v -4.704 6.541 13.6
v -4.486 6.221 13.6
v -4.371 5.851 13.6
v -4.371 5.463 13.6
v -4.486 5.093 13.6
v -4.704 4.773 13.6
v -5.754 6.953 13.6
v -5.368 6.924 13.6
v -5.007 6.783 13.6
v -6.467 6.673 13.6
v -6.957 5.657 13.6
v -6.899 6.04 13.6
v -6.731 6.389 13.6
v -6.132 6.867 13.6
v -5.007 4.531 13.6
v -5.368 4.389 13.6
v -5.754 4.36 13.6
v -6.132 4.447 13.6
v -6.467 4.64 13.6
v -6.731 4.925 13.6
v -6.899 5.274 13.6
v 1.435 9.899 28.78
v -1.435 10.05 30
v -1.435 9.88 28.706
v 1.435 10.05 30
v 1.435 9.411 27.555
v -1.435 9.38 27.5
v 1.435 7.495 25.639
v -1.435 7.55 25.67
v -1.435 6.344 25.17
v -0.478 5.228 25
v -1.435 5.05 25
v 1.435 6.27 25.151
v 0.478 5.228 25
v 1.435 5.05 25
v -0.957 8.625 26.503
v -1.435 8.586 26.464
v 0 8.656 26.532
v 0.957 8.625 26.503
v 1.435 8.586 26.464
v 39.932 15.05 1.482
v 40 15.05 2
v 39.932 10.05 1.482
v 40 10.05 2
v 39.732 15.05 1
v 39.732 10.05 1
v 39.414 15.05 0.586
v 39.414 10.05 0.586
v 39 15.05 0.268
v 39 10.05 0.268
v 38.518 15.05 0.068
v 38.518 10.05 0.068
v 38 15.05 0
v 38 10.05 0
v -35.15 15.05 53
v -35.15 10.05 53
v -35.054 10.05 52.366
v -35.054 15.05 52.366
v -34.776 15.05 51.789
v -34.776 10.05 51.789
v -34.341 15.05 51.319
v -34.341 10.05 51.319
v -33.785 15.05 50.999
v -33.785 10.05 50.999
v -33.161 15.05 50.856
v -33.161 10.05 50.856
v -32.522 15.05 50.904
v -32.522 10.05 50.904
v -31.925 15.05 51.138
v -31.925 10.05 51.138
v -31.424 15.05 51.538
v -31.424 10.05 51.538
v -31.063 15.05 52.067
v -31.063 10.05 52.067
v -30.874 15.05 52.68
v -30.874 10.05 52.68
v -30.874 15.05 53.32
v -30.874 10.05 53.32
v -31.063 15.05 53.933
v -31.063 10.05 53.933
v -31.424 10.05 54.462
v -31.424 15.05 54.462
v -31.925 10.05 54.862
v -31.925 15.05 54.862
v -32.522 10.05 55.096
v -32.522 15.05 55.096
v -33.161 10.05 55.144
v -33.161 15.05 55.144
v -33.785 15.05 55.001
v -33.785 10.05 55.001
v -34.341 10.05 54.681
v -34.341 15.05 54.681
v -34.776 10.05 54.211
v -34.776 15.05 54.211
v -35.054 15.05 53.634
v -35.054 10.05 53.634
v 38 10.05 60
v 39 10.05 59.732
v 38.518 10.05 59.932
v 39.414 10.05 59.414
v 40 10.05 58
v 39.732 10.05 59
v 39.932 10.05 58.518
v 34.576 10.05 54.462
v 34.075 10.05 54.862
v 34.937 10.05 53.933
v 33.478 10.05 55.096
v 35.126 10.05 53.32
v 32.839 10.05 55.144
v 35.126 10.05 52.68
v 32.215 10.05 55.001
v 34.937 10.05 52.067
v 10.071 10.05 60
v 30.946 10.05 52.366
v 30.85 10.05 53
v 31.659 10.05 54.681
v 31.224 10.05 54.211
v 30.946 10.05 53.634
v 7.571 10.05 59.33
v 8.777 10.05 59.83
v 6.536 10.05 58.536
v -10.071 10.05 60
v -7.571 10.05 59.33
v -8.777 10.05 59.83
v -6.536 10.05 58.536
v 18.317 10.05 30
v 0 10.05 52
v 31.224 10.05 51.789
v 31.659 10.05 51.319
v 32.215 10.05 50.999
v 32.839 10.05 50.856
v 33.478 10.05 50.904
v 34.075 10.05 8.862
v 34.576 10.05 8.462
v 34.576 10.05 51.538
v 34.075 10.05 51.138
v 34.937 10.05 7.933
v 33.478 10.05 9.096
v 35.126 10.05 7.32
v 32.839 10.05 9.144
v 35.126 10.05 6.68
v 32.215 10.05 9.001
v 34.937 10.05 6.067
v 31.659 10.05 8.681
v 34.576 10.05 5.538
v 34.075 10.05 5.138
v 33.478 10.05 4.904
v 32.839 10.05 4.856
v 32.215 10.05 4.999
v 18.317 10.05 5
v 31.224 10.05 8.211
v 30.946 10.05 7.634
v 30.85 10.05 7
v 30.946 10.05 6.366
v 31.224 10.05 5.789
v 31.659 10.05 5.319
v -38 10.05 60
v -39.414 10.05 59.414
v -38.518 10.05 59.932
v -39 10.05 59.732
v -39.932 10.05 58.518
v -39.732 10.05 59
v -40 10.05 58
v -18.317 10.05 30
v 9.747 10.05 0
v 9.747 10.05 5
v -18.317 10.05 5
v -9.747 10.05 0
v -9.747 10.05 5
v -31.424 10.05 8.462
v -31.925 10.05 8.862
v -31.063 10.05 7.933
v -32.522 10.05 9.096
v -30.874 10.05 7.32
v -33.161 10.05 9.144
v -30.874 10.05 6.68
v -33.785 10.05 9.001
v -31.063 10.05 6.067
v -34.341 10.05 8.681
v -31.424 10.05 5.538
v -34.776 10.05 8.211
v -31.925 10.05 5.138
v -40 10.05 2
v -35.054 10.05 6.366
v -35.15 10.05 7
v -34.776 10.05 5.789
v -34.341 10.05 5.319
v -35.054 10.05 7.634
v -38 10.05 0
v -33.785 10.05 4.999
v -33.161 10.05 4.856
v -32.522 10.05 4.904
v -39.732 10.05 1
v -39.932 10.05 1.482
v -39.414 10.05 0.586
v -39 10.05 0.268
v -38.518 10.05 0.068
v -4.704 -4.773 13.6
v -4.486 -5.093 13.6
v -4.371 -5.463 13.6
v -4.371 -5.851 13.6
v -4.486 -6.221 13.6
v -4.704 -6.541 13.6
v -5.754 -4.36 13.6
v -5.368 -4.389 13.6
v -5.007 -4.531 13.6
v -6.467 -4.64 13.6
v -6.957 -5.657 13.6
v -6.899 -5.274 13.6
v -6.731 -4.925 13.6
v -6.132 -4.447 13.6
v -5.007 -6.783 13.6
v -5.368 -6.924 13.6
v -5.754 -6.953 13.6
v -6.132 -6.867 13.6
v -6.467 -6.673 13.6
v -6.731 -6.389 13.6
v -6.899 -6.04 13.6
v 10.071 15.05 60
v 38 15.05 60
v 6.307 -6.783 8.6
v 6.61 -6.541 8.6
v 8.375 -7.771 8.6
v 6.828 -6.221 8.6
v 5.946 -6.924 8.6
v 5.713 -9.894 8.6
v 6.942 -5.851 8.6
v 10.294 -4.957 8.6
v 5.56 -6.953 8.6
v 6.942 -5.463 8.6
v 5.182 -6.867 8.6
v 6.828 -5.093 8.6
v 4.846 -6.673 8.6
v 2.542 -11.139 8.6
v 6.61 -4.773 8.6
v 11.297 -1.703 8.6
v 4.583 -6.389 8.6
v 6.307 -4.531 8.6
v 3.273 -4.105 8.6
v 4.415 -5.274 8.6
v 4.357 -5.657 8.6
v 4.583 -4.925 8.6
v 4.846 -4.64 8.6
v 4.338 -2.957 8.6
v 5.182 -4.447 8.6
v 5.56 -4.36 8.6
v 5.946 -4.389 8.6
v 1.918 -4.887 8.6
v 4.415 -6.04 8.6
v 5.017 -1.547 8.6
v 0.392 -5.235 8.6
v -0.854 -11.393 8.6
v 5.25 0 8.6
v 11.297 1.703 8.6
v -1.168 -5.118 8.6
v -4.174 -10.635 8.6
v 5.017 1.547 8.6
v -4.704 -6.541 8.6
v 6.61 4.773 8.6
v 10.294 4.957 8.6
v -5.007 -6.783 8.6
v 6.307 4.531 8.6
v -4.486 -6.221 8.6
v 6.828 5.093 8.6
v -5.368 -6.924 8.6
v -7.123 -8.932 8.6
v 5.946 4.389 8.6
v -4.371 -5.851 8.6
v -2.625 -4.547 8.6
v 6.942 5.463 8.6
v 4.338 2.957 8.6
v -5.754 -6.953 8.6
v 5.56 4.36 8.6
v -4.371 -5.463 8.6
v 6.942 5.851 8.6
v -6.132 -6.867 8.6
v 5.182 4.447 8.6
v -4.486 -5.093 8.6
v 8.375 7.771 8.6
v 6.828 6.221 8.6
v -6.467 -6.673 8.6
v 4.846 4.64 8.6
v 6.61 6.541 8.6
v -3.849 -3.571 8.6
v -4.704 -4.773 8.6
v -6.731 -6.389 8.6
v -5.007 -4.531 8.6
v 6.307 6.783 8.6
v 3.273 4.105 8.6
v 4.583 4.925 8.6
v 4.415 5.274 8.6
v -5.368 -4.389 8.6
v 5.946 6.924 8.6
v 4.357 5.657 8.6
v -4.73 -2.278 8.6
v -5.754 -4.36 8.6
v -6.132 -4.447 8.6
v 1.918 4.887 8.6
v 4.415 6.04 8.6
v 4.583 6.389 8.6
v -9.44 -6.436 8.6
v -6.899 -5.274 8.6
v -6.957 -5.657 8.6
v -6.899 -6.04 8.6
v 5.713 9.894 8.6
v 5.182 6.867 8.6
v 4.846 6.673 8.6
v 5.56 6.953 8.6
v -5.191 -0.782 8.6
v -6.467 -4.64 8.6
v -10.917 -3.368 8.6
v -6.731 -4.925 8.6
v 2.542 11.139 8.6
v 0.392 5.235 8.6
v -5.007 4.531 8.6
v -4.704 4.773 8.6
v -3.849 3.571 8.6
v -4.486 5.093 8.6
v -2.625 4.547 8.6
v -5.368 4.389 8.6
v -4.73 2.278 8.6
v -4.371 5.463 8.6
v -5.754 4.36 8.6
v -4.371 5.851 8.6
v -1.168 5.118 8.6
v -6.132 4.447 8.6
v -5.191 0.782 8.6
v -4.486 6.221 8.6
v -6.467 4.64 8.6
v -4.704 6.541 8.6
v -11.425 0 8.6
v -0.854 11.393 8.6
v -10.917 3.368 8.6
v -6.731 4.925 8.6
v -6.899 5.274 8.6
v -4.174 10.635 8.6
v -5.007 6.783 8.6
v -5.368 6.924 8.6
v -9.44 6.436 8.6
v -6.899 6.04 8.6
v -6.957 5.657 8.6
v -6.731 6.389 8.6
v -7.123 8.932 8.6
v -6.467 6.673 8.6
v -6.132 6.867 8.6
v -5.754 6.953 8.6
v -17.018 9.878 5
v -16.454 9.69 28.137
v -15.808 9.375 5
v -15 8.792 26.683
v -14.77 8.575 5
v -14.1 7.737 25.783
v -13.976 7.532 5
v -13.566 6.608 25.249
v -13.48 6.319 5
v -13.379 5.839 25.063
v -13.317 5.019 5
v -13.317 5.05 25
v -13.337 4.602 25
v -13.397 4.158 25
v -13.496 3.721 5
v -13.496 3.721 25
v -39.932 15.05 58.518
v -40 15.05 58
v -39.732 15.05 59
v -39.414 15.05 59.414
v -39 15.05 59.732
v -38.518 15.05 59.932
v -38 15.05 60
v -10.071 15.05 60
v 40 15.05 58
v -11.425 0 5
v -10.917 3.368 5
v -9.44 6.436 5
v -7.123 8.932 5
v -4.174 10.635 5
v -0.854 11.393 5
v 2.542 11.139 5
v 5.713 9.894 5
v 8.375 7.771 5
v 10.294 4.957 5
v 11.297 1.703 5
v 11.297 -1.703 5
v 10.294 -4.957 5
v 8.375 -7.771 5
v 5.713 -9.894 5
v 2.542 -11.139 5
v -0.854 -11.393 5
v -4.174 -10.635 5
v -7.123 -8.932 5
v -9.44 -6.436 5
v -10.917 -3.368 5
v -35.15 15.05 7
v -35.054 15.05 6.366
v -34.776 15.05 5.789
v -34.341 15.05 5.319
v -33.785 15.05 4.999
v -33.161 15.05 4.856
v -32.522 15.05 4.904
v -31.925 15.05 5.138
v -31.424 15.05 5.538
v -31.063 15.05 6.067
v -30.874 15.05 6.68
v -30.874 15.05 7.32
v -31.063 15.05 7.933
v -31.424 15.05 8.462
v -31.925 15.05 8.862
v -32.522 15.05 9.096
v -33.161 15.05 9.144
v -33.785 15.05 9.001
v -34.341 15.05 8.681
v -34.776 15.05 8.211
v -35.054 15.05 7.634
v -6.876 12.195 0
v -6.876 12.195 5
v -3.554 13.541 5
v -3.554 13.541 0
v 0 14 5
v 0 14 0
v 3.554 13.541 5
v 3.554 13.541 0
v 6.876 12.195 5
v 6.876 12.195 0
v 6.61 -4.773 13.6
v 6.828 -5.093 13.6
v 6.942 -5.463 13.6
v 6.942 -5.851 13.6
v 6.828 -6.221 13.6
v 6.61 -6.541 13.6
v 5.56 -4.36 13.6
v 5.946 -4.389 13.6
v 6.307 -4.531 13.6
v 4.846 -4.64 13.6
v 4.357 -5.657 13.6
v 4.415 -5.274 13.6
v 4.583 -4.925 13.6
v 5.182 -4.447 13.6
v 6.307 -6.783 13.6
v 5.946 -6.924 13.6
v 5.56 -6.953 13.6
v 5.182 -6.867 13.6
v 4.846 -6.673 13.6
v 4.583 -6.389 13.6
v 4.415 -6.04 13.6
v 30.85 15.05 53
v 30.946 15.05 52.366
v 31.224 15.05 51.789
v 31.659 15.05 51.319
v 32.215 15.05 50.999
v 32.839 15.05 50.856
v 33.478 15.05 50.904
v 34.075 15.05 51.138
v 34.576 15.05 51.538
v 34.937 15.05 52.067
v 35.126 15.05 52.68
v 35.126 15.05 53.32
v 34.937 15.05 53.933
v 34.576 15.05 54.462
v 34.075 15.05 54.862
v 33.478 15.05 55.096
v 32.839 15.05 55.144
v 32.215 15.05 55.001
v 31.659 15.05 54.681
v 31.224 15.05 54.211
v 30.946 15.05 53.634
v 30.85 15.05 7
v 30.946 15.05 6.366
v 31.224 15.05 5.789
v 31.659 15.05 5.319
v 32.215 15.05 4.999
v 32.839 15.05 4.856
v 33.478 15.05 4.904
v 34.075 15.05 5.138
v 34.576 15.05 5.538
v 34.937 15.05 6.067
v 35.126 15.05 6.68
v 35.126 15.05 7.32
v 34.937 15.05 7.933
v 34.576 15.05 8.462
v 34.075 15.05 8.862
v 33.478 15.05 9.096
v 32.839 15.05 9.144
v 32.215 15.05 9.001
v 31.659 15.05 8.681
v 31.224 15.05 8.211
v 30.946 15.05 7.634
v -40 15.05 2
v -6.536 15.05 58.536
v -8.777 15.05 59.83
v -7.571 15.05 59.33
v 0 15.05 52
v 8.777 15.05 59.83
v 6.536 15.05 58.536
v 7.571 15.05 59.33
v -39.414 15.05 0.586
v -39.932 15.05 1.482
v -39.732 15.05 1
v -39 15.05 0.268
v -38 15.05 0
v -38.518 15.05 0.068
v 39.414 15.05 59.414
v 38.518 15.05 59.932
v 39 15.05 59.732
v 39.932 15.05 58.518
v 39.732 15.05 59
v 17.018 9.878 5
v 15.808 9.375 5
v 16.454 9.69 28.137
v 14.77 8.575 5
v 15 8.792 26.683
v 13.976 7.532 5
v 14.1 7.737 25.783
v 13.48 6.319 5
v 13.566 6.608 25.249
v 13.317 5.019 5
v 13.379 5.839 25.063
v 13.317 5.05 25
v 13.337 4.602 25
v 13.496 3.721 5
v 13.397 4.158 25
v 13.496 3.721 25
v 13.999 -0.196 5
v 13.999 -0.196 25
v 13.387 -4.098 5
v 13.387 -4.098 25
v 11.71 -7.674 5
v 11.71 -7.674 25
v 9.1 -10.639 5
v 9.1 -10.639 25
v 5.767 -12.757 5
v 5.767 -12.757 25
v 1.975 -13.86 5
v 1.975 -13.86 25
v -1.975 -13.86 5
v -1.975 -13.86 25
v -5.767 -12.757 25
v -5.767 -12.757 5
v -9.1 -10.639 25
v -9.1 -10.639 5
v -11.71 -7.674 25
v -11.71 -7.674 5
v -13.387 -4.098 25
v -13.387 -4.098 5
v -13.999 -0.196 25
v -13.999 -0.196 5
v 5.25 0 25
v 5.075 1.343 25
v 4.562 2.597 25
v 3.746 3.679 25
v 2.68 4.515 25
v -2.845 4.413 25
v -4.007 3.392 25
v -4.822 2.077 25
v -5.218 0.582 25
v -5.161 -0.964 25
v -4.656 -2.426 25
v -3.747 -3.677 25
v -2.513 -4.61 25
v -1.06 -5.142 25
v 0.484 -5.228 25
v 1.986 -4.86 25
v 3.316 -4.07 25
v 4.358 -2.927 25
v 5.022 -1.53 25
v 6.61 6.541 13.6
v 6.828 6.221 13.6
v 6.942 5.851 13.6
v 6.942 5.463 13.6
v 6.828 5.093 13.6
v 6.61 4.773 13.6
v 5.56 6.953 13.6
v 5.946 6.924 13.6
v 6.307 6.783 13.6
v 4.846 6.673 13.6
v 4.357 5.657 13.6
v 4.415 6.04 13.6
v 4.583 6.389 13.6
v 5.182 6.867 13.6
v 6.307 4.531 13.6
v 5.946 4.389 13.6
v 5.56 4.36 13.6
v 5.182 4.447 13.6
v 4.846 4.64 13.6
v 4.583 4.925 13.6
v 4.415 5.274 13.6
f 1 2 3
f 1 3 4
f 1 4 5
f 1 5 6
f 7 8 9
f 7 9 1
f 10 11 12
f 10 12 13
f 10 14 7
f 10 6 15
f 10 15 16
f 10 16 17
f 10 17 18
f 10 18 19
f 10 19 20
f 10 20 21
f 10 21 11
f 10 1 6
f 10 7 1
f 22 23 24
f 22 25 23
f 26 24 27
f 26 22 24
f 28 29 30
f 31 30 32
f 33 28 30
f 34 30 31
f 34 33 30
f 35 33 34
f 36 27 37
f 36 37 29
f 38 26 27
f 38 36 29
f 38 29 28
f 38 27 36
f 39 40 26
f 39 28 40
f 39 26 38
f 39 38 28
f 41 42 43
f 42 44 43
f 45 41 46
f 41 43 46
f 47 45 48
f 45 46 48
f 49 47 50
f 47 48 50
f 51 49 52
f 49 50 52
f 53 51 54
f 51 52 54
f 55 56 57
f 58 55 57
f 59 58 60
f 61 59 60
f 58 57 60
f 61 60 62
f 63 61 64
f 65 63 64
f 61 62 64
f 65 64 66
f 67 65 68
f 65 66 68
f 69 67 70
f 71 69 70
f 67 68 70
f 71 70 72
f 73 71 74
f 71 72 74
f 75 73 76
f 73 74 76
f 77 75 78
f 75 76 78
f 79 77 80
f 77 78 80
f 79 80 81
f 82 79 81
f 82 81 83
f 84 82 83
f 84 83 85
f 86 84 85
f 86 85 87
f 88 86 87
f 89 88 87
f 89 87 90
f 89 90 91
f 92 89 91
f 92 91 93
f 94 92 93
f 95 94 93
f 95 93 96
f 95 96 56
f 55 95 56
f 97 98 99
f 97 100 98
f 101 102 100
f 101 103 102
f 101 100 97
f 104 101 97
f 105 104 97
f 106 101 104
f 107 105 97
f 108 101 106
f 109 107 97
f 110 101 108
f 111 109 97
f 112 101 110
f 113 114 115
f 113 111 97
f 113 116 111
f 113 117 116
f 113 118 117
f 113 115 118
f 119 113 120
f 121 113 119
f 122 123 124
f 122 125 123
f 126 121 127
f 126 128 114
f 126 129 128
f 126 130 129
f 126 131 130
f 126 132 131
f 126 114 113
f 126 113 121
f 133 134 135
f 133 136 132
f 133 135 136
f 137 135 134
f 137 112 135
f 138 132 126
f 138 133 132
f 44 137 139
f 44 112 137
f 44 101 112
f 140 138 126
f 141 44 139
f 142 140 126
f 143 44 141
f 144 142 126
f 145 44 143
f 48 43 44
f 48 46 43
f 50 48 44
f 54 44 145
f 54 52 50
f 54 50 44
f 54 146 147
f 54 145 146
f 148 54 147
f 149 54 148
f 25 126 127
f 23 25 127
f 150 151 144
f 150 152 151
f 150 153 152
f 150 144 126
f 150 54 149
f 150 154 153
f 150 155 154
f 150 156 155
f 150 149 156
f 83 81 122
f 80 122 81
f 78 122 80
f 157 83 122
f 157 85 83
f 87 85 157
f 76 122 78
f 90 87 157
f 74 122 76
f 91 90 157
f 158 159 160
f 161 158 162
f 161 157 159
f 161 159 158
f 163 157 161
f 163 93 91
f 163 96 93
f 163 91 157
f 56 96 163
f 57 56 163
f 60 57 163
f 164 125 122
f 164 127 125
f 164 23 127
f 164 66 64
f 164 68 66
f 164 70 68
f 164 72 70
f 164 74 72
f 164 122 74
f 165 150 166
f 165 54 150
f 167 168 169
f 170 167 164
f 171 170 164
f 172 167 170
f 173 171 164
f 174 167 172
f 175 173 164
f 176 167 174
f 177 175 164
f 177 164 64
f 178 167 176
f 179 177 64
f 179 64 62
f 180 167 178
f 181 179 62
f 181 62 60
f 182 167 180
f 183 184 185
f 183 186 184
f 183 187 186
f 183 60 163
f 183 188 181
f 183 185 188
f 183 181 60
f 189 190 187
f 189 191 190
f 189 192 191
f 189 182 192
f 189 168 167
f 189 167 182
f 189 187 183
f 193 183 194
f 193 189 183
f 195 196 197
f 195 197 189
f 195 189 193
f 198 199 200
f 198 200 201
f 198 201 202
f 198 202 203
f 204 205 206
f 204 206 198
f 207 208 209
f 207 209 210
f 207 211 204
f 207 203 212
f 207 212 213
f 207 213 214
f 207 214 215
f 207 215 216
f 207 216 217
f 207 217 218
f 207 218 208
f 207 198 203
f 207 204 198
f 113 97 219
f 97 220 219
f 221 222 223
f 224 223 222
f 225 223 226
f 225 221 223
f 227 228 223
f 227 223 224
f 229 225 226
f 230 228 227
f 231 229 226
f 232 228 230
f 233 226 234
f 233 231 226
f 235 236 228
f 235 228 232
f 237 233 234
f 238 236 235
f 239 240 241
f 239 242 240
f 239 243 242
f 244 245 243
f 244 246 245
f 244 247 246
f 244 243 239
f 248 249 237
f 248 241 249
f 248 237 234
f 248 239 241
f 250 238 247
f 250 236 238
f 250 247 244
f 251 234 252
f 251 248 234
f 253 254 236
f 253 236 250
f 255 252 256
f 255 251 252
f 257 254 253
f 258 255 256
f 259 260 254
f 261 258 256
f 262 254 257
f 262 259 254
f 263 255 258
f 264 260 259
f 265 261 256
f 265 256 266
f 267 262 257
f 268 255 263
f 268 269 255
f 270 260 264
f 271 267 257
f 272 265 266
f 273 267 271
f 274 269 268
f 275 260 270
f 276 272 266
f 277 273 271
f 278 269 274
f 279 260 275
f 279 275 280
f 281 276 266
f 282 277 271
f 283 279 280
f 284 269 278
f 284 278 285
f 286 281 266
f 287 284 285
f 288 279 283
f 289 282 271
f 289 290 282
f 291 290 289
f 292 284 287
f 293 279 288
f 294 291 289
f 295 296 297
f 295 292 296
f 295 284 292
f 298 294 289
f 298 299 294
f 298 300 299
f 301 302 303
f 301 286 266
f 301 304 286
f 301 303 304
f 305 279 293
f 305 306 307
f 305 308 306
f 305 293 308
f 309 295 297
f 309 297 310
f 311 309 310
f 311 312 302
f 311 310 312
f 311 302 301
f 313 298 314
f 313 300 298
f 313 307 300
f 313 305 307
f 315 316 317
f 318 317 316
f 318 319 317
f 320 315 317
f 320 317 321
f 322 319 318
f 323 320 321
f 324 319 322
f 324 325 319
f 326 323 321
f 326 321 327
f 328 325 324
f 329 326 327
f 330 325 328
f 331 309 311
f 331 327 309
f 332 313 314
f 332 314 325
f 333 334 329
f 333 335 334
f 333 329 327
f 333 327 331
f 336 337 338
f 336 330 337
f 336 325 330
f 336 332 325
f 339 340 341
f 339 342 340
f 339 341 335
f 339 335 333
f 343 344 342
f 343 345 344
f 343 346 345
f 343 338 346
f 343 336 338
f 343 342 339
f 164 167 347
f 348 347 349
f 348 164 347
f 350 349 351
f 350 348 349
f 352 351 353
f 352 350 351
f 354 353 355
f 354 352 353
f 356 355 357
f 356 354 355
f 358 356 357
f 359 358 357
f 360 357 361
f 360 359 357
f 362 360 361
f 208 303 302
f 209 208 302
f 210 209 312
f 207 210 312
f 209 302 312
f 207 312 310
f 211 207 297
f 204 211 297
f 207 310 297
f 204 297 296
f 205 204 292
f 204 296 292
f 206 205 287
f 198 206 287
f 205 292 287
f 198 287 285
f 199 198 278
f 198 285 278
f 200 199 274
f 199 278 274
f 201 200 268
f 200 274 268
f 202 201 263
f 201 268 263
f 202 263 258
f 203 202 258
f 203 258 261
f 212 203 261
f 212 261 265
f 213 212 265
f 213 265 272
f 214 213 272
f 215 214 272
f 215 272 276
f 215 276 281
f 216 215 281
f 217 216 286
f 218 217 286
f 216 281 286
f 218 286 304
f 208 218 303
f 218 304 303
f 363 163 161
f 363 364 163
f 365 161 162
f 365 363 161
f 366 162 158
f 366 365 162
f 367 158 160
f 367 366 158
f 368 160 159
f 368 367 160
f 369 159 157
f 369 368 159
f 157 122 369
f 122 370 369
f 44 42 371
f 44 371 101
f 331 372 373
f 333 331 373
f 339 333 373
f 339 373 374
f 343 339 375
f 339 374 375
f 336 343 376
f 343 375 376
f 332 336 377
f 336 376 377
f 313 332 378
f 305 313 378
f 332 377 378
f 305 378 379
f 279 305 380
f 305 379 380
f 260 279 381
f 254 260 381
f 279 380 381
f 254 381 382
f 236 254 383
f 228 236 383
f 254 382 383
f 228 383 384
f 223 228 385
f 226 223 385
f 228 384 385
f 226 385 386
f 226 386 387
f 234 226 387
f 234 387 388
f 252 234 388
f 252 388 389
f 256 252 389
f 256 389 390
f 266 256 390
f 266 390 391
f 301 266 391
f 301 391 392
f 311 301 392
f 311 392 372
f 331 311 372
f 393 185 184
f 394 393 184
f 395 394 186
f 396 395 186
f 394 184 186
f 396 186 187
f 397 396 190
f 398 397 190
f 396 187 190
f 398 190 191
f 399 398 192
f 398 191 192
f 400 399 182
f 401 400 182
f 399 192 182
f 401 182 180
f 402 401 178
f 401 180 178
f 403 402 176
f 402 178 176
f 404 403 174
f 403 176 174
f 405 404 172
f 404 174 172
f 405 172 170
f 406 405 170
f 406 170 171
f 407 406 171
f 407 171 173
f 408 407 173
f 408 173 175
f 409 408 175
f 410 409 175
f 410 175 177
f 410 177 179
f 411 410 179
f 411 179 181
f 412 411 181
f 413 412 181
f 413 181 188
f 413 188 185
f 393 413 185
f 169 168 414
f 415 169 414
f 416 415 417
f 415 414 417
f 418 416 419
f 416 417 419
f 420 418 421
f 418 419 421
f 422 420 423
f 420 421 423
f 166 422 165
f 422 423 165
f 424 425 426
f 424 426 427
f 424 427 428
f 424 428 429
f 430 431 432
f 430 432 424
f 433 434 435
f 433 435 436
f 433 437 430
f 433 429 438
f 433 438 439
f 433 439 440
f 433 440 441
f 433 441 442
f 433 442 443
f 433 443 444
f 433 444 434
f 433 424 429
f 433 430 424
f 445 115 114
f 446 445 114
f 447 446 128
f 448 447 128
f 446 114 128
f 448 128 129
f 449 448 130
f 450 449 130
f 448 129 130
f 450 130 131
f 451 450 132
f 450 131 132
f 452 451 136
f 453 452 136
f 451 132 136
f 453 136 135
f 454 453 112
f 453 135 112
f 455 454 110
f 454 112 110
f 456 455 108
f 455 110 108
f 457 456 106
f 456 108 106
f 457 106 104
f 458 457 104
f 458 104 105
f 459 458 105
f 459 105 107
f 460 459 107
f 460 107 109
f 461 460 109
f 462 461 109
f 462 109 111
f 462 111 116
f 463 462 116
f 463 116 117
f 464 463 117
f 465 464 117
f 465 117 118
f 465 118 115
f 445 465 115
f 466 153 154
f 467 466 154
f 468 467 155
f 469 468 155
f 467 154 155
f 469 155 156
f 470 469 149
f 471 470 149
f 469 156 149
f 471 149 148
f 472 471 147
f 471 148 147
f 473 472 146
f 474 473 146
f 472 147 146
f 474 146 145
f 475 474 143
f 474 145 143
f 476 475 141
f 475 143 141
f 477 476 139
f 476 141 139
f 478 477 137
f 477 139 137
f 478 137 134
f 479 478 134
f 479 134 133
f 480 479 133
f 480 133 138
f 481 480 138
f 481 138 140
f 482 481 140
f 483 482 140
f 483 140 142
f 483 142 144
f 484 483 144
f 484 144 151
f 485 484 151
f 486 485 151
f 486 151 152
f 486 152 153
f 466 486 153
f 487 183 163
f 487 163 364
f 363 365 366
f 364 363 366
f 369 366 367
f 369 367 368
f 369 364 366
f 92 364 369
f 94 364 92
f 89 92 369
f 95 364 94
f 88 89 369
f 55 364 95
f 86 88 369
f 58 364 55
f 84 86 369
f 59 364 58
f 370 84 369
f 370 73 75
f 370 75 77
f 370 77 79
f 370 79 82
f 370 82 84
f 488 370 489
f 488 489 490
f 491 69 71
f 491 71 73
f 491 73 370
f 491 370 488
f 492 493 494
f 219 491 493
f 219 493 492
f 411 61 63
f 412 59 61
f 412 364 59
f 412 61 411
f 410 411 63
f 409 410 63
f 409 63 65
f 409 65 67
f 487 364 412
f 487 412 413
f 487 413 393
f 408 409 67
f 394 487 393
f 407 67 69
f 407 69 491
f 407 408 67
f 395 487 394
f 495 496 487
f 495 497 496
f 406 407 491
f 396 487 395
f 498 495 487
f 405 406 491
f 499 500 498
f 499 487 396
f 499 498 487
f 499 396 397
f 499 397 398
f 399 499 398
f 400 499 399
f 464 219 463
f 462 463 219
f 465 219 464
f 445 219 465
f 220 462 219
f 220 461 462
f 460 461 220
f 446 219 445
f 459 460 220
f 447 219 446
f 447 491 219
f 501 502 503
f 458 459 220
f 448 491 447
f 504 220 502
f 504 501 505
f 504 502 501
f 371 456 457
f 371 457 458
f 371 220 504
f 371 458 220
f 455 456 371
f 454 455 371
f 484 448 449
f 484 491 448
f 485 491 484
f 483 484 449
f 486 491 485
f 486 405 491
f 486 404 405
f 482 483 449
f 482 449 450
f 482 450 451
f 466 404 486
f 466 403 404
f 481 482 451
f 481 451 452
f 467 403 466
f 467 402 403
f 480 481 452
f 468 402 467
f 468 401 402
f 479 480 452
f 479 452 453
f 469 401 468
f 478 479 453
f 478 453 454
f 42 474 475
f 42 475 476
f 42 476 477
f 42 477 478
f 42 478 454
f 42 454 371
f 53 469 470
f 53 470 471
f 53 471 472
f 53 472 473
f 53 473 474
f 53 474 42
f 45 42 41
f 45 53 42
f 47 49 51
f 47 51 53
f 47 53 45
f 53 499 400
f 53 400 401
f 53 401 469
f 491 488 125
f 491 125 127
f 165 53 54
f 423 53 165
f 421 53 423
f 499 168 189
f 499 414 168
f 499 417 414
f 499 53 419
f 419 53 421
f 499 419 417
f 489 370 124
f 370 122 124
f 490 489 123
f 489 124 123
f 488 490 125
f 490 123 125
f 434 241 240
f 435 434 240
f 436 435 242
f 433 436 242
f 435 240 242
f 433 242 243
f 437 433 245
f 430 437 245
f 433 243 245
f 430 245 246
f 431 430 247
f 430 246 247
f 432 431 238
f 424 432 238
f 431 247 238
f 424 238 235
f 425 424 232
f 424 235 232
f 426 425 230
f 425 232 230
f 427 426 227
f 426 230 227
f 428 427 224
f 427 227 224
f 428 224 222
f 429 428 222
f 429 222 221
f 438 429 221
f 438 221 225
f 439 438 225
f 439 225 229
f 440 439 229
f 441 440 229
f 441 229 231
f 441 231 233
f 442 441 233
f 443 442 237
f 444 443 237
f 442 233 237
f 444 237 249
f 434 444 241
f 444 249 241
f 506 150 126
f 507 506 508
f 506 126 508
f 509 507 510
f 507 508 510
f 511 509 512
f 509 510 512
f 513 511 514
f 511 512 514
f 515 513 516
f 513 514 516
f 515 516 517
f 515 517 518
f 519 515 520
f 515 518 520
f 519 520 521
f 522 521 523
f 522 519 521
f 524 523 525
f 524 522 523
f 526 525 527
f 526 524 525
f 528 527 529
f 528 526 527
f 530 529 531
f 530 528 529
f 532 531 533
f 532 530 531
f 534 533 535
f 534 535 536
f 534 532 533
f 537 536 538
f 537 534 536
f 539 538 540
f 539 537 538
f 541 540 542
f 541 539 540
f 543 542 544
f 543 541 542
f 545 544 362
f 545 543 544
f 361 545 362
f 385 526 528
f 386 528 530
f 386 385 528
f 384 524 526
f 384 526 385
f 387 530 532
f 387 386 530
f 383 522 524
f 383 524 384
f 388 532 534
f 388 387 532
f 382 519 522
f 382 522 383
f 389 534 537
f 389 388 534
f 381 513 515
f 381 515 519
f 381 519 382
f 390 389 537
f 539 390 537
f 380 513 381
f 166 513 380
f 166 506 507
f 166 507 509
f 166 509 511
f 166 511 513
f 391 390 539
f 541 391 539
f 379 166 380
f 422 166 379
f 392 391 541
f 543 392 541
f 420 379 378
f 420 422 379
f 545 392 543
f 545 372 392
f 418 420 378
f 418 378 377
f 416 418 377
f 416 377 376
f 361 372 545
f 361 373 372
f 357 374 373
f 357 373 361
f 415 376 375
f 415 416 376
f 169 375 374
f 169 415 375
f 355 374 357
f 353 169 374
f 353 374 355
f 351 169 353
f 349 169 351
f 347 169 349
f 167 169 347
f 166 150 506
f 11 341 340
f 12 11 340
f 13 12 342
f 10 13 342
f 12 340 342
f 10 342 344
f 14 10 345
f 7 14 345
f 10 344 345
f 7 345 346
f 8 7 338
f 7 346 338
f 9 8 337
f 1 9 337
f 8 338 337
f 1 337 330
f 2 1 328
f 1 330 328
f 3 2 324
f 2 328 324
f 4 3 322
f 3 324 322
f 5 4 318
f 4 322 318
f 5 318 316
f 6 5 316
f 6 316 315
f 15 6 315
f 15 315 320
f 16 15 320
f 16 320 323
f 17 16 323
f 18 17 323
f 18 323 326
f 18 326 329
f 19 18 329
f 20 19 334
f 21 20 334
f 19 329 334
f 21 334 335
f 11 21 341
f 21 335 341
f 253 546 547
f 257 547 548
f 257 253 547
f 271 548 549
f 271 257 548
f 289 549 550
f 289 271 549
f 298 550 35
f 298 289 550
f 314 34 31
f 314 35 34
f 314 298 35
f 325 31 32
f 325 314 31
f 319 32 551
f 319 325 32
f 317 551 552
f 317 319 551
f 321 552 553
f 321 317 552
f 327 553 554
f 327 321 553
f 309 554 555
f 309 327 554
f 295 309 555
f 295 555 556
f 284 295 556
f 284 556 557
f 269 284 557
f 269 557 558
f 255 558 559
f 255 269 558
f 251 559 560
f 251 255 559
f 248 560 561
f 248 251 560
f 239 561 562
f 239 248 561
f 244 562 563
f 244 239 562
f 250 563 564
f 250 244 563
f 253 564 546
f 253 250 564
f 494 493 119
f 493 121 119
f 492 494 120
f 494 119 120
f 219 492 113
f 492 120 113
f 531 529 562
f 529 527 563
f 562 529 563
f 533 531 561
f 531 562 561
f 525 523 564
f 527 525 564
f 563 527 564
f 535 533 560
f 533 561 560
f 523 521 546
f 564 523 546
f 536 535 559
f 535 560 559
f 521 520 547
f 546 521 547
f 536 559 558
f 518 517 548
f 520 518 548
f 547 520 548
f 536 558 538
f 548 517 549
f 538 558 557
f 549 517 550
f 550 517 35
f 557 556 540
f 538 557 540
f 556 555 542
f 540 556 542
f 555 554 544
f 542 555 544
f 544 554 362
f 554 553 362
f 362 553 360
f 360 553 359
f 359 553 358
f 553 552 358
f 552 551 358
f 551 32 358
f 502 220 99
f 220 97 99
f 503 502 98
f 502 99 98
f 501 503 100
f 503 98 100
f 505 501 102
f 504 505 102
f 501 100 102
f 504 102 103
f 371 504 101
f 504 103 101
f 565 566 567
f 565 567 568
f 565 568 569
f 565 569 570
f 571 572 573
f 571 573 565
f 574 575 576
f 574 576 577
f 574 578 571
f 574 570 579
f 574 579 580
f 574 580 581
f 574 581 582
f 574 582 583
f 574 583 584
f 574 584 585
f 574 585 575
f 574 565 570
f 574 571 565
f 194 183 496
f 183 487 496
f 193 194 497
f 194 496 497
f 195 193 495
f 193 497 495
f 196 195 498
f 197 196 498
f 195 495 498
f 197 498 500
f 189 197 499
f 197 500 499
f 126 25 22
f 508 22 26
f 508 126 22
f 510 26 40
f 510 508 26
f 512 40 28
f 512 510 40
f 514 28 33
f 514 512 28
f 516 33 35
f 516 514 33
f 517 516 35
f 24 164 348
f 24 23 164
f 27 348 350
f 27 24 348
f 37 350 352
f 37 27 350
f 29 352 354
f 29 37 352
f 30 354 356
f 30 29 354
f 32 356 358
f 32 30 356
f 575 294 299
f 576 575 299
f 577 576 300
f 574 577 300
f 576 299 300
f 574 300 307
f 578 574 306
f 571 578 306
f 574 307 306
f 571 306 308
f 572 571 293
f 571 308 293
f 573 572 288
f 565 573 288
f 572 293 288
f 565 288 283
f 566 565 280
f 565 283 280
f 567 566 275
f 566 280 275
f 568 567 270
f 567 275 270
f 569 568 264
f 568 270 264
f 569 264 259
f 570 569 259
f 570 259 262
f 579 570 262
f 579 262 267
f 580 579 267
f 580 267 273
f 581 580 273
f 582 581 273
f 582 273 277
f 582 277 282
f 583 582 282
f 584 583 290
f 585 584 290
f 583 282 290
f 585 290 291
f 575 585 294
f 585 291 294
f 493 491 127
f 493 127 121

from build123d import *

# Parameters (mm, degrees)
SKETCH1_R           = 5.25
BOSS_EXTRUDE1_DEPTH = 60
SKETCH2_R           = 11.425
CUT_EXTRUDE1_DEPTH  = 8.6
SKETCH3_R           = 14
CUT_EXTRUDE2_DEPTH  = 5
SKETCH4_R           = 1.3
CUT_EXTRUDE3_DEPTH  = 5
SKETCH6_R           = 2.15
CUT_EXTRUDE5_DEPTH  = 6
CUT_EXTRUDE6_DEPTH  = 35
FILLET2_R           = 5
FILLET3_R           = 2
FILLET4_R           = 5
CUT_EXTRUDE7_DEPTH  = 30.05
FILLET5_R           = 5


with BuildPart() as part:
    # Sketch1 → Boss-Extrude1 (new body)
    with BuildSketch(Plane.XY):
        with BuildLine():
            Line((-40, 15.05), (40, 15.05))
            Line((40, 15.05), (40, 10.05))
            Line((40, 10.05), (9.746666097, 10.05))
            ThreePointArc((9.746666097, 10.05), (0, -14), (-9.746666097, 10.05))
            Line((-9.746666097, 10.05), (-40, 10.05))
            Line((-40, 10.05), (-40, 15.05))
        make_face()
        Circle(SKETCH1_R, mode=Mode.SUBTRACT)
    extrude(amount=BOSS_EXTRUDE1_DEPTH)

    # Sketch2 → Cut-Extrude1 (cut)
    with BuildSketch(Plane(origin=(0, 0, 0), x_dir=(-1, 0, 0), z_dir=(0, 0, -1))):
        Circle(SKETCH2_R)
    extrude(amount=-CUT_EXTRUDE1_DEPTH, mode=Mode.SUBTRACT)

    # Sketch3 → Cut-Extrude2 (cut)
    with BuildSketch(Plane(origin=(0, 0, 0), x_dir=(-1, 0, 0), z_dir=(0, 0, -1))):
        Circle(SKETCH3_R)
    extrude(amount=-CUT_EXTRUDE2_DEPTH, mode=Mode.SUBTRACT)

    # Sketch4 → Cut-Extrude3 (cut)
    with BuildSketch(Plane(origin=(0, 0, 8.6), x_dir=(-1, 0, 0), z_dir=(0, 0, -1))):
        with Locations((5.656854249, 5.656854249)):
            Circle(SKETCH4_R)
        with Locations((5.656854249, -5.656854249)):
            Circle(SKETCH4_R)
        with Locations((-5.656854249, -5.656854249)):
            Circle(SKETCH4_R)
        with Locations((-5.656854249, 5.656854249)):
            Circle(SKETCH4_R)
    extrude(amount=-CUT_EXTRUDE3_DEPTH, mode=Mode.SUBTRACT)

    # Sketch6 → Cut-Extrude5 (cut, through all)
    with BuildSketch(Plane(origin=(0, 10.05, 0), x_dir=(-1, 0, 0), z_dir=(0, -1, 0))):
        with Locations((33, -53)):
            Circle(SKETCH6_R)
        with Locations((33, -7)):
            Circle(SKETCH6_R)
        with Locations((-33, -53)):
            Circle(SKETCH6_R)
        with Locations((-33, -7)):
            Circle(SKETCH6_R)
    extrude(amount=-CUT_EXTRUDE5_DEPTH, mode=Mode.SUBTRACT)

    # Sketch7 → Cut-Extrude6 (cut)
    with BuildSketch(Plane.XY.offset(60)):
        with BuildLine():
            Line((-9.746666097, 10.05), (9.746666097, 10.05))
            ThreePointArc((9.746666097, 10.05), (0, -14), (-9.746666097, 10.05))
        make_face()
    extrude(amount=-CUT_EXTRUDE6_DEPTH, mode=Mode.SUBTRACT)

    # Fillet2
    fillet2_edges = [part.edges().sort_by_distance(p)[0] for p in [
        (9.746666097, 10.05, 15),
        (-9.746666097, 10.05, 15),
    ]]
    fillet(fillet2_edges, radius=FILLET2_R)

    # Fillet3
    fillet3_edges = [part.edges().sort_by_distance(p)[0] for p in [
        (40, 12.55, 60),
        (-40, 12.55, 60),
        (40, 12.55, 0),
        (-40, 12.55, 0),
    ]]
    fillet(fillet3_edges, radius=FILLET3_R)

    # Fillet4
    fillet4_edges = [part.edges().sort_by_distance(p)[0] for p in [
        (0, 10.05, 25),
    ]]
    fillet(fillet4_edges, radius=FILLET4_R)

    # Sketch8 → Cut-Extrude7 (cut, through all)
    with BuildSketch(Plane(origin=(0, 15.05, 0), x_dir=(1, 0, 0), z_dir=(0, 1, 0))):
        Polygon((0, -52), (8, -60), (-8, -60), align=None)
    extrude(amount=-CUT_EXTRUDE7_DEPTH, mode=Mode.SUBTRACT)

    # Fillet5
    fillet5_edges = [part.edges().sort_by_distance(p)[0] for p in [
        (-8, 12.55, 60),
        (8, 12.55, 60),
    ]]
    fillet(fillet5_edges, radius=FILLET5_R)


solid = part.part
